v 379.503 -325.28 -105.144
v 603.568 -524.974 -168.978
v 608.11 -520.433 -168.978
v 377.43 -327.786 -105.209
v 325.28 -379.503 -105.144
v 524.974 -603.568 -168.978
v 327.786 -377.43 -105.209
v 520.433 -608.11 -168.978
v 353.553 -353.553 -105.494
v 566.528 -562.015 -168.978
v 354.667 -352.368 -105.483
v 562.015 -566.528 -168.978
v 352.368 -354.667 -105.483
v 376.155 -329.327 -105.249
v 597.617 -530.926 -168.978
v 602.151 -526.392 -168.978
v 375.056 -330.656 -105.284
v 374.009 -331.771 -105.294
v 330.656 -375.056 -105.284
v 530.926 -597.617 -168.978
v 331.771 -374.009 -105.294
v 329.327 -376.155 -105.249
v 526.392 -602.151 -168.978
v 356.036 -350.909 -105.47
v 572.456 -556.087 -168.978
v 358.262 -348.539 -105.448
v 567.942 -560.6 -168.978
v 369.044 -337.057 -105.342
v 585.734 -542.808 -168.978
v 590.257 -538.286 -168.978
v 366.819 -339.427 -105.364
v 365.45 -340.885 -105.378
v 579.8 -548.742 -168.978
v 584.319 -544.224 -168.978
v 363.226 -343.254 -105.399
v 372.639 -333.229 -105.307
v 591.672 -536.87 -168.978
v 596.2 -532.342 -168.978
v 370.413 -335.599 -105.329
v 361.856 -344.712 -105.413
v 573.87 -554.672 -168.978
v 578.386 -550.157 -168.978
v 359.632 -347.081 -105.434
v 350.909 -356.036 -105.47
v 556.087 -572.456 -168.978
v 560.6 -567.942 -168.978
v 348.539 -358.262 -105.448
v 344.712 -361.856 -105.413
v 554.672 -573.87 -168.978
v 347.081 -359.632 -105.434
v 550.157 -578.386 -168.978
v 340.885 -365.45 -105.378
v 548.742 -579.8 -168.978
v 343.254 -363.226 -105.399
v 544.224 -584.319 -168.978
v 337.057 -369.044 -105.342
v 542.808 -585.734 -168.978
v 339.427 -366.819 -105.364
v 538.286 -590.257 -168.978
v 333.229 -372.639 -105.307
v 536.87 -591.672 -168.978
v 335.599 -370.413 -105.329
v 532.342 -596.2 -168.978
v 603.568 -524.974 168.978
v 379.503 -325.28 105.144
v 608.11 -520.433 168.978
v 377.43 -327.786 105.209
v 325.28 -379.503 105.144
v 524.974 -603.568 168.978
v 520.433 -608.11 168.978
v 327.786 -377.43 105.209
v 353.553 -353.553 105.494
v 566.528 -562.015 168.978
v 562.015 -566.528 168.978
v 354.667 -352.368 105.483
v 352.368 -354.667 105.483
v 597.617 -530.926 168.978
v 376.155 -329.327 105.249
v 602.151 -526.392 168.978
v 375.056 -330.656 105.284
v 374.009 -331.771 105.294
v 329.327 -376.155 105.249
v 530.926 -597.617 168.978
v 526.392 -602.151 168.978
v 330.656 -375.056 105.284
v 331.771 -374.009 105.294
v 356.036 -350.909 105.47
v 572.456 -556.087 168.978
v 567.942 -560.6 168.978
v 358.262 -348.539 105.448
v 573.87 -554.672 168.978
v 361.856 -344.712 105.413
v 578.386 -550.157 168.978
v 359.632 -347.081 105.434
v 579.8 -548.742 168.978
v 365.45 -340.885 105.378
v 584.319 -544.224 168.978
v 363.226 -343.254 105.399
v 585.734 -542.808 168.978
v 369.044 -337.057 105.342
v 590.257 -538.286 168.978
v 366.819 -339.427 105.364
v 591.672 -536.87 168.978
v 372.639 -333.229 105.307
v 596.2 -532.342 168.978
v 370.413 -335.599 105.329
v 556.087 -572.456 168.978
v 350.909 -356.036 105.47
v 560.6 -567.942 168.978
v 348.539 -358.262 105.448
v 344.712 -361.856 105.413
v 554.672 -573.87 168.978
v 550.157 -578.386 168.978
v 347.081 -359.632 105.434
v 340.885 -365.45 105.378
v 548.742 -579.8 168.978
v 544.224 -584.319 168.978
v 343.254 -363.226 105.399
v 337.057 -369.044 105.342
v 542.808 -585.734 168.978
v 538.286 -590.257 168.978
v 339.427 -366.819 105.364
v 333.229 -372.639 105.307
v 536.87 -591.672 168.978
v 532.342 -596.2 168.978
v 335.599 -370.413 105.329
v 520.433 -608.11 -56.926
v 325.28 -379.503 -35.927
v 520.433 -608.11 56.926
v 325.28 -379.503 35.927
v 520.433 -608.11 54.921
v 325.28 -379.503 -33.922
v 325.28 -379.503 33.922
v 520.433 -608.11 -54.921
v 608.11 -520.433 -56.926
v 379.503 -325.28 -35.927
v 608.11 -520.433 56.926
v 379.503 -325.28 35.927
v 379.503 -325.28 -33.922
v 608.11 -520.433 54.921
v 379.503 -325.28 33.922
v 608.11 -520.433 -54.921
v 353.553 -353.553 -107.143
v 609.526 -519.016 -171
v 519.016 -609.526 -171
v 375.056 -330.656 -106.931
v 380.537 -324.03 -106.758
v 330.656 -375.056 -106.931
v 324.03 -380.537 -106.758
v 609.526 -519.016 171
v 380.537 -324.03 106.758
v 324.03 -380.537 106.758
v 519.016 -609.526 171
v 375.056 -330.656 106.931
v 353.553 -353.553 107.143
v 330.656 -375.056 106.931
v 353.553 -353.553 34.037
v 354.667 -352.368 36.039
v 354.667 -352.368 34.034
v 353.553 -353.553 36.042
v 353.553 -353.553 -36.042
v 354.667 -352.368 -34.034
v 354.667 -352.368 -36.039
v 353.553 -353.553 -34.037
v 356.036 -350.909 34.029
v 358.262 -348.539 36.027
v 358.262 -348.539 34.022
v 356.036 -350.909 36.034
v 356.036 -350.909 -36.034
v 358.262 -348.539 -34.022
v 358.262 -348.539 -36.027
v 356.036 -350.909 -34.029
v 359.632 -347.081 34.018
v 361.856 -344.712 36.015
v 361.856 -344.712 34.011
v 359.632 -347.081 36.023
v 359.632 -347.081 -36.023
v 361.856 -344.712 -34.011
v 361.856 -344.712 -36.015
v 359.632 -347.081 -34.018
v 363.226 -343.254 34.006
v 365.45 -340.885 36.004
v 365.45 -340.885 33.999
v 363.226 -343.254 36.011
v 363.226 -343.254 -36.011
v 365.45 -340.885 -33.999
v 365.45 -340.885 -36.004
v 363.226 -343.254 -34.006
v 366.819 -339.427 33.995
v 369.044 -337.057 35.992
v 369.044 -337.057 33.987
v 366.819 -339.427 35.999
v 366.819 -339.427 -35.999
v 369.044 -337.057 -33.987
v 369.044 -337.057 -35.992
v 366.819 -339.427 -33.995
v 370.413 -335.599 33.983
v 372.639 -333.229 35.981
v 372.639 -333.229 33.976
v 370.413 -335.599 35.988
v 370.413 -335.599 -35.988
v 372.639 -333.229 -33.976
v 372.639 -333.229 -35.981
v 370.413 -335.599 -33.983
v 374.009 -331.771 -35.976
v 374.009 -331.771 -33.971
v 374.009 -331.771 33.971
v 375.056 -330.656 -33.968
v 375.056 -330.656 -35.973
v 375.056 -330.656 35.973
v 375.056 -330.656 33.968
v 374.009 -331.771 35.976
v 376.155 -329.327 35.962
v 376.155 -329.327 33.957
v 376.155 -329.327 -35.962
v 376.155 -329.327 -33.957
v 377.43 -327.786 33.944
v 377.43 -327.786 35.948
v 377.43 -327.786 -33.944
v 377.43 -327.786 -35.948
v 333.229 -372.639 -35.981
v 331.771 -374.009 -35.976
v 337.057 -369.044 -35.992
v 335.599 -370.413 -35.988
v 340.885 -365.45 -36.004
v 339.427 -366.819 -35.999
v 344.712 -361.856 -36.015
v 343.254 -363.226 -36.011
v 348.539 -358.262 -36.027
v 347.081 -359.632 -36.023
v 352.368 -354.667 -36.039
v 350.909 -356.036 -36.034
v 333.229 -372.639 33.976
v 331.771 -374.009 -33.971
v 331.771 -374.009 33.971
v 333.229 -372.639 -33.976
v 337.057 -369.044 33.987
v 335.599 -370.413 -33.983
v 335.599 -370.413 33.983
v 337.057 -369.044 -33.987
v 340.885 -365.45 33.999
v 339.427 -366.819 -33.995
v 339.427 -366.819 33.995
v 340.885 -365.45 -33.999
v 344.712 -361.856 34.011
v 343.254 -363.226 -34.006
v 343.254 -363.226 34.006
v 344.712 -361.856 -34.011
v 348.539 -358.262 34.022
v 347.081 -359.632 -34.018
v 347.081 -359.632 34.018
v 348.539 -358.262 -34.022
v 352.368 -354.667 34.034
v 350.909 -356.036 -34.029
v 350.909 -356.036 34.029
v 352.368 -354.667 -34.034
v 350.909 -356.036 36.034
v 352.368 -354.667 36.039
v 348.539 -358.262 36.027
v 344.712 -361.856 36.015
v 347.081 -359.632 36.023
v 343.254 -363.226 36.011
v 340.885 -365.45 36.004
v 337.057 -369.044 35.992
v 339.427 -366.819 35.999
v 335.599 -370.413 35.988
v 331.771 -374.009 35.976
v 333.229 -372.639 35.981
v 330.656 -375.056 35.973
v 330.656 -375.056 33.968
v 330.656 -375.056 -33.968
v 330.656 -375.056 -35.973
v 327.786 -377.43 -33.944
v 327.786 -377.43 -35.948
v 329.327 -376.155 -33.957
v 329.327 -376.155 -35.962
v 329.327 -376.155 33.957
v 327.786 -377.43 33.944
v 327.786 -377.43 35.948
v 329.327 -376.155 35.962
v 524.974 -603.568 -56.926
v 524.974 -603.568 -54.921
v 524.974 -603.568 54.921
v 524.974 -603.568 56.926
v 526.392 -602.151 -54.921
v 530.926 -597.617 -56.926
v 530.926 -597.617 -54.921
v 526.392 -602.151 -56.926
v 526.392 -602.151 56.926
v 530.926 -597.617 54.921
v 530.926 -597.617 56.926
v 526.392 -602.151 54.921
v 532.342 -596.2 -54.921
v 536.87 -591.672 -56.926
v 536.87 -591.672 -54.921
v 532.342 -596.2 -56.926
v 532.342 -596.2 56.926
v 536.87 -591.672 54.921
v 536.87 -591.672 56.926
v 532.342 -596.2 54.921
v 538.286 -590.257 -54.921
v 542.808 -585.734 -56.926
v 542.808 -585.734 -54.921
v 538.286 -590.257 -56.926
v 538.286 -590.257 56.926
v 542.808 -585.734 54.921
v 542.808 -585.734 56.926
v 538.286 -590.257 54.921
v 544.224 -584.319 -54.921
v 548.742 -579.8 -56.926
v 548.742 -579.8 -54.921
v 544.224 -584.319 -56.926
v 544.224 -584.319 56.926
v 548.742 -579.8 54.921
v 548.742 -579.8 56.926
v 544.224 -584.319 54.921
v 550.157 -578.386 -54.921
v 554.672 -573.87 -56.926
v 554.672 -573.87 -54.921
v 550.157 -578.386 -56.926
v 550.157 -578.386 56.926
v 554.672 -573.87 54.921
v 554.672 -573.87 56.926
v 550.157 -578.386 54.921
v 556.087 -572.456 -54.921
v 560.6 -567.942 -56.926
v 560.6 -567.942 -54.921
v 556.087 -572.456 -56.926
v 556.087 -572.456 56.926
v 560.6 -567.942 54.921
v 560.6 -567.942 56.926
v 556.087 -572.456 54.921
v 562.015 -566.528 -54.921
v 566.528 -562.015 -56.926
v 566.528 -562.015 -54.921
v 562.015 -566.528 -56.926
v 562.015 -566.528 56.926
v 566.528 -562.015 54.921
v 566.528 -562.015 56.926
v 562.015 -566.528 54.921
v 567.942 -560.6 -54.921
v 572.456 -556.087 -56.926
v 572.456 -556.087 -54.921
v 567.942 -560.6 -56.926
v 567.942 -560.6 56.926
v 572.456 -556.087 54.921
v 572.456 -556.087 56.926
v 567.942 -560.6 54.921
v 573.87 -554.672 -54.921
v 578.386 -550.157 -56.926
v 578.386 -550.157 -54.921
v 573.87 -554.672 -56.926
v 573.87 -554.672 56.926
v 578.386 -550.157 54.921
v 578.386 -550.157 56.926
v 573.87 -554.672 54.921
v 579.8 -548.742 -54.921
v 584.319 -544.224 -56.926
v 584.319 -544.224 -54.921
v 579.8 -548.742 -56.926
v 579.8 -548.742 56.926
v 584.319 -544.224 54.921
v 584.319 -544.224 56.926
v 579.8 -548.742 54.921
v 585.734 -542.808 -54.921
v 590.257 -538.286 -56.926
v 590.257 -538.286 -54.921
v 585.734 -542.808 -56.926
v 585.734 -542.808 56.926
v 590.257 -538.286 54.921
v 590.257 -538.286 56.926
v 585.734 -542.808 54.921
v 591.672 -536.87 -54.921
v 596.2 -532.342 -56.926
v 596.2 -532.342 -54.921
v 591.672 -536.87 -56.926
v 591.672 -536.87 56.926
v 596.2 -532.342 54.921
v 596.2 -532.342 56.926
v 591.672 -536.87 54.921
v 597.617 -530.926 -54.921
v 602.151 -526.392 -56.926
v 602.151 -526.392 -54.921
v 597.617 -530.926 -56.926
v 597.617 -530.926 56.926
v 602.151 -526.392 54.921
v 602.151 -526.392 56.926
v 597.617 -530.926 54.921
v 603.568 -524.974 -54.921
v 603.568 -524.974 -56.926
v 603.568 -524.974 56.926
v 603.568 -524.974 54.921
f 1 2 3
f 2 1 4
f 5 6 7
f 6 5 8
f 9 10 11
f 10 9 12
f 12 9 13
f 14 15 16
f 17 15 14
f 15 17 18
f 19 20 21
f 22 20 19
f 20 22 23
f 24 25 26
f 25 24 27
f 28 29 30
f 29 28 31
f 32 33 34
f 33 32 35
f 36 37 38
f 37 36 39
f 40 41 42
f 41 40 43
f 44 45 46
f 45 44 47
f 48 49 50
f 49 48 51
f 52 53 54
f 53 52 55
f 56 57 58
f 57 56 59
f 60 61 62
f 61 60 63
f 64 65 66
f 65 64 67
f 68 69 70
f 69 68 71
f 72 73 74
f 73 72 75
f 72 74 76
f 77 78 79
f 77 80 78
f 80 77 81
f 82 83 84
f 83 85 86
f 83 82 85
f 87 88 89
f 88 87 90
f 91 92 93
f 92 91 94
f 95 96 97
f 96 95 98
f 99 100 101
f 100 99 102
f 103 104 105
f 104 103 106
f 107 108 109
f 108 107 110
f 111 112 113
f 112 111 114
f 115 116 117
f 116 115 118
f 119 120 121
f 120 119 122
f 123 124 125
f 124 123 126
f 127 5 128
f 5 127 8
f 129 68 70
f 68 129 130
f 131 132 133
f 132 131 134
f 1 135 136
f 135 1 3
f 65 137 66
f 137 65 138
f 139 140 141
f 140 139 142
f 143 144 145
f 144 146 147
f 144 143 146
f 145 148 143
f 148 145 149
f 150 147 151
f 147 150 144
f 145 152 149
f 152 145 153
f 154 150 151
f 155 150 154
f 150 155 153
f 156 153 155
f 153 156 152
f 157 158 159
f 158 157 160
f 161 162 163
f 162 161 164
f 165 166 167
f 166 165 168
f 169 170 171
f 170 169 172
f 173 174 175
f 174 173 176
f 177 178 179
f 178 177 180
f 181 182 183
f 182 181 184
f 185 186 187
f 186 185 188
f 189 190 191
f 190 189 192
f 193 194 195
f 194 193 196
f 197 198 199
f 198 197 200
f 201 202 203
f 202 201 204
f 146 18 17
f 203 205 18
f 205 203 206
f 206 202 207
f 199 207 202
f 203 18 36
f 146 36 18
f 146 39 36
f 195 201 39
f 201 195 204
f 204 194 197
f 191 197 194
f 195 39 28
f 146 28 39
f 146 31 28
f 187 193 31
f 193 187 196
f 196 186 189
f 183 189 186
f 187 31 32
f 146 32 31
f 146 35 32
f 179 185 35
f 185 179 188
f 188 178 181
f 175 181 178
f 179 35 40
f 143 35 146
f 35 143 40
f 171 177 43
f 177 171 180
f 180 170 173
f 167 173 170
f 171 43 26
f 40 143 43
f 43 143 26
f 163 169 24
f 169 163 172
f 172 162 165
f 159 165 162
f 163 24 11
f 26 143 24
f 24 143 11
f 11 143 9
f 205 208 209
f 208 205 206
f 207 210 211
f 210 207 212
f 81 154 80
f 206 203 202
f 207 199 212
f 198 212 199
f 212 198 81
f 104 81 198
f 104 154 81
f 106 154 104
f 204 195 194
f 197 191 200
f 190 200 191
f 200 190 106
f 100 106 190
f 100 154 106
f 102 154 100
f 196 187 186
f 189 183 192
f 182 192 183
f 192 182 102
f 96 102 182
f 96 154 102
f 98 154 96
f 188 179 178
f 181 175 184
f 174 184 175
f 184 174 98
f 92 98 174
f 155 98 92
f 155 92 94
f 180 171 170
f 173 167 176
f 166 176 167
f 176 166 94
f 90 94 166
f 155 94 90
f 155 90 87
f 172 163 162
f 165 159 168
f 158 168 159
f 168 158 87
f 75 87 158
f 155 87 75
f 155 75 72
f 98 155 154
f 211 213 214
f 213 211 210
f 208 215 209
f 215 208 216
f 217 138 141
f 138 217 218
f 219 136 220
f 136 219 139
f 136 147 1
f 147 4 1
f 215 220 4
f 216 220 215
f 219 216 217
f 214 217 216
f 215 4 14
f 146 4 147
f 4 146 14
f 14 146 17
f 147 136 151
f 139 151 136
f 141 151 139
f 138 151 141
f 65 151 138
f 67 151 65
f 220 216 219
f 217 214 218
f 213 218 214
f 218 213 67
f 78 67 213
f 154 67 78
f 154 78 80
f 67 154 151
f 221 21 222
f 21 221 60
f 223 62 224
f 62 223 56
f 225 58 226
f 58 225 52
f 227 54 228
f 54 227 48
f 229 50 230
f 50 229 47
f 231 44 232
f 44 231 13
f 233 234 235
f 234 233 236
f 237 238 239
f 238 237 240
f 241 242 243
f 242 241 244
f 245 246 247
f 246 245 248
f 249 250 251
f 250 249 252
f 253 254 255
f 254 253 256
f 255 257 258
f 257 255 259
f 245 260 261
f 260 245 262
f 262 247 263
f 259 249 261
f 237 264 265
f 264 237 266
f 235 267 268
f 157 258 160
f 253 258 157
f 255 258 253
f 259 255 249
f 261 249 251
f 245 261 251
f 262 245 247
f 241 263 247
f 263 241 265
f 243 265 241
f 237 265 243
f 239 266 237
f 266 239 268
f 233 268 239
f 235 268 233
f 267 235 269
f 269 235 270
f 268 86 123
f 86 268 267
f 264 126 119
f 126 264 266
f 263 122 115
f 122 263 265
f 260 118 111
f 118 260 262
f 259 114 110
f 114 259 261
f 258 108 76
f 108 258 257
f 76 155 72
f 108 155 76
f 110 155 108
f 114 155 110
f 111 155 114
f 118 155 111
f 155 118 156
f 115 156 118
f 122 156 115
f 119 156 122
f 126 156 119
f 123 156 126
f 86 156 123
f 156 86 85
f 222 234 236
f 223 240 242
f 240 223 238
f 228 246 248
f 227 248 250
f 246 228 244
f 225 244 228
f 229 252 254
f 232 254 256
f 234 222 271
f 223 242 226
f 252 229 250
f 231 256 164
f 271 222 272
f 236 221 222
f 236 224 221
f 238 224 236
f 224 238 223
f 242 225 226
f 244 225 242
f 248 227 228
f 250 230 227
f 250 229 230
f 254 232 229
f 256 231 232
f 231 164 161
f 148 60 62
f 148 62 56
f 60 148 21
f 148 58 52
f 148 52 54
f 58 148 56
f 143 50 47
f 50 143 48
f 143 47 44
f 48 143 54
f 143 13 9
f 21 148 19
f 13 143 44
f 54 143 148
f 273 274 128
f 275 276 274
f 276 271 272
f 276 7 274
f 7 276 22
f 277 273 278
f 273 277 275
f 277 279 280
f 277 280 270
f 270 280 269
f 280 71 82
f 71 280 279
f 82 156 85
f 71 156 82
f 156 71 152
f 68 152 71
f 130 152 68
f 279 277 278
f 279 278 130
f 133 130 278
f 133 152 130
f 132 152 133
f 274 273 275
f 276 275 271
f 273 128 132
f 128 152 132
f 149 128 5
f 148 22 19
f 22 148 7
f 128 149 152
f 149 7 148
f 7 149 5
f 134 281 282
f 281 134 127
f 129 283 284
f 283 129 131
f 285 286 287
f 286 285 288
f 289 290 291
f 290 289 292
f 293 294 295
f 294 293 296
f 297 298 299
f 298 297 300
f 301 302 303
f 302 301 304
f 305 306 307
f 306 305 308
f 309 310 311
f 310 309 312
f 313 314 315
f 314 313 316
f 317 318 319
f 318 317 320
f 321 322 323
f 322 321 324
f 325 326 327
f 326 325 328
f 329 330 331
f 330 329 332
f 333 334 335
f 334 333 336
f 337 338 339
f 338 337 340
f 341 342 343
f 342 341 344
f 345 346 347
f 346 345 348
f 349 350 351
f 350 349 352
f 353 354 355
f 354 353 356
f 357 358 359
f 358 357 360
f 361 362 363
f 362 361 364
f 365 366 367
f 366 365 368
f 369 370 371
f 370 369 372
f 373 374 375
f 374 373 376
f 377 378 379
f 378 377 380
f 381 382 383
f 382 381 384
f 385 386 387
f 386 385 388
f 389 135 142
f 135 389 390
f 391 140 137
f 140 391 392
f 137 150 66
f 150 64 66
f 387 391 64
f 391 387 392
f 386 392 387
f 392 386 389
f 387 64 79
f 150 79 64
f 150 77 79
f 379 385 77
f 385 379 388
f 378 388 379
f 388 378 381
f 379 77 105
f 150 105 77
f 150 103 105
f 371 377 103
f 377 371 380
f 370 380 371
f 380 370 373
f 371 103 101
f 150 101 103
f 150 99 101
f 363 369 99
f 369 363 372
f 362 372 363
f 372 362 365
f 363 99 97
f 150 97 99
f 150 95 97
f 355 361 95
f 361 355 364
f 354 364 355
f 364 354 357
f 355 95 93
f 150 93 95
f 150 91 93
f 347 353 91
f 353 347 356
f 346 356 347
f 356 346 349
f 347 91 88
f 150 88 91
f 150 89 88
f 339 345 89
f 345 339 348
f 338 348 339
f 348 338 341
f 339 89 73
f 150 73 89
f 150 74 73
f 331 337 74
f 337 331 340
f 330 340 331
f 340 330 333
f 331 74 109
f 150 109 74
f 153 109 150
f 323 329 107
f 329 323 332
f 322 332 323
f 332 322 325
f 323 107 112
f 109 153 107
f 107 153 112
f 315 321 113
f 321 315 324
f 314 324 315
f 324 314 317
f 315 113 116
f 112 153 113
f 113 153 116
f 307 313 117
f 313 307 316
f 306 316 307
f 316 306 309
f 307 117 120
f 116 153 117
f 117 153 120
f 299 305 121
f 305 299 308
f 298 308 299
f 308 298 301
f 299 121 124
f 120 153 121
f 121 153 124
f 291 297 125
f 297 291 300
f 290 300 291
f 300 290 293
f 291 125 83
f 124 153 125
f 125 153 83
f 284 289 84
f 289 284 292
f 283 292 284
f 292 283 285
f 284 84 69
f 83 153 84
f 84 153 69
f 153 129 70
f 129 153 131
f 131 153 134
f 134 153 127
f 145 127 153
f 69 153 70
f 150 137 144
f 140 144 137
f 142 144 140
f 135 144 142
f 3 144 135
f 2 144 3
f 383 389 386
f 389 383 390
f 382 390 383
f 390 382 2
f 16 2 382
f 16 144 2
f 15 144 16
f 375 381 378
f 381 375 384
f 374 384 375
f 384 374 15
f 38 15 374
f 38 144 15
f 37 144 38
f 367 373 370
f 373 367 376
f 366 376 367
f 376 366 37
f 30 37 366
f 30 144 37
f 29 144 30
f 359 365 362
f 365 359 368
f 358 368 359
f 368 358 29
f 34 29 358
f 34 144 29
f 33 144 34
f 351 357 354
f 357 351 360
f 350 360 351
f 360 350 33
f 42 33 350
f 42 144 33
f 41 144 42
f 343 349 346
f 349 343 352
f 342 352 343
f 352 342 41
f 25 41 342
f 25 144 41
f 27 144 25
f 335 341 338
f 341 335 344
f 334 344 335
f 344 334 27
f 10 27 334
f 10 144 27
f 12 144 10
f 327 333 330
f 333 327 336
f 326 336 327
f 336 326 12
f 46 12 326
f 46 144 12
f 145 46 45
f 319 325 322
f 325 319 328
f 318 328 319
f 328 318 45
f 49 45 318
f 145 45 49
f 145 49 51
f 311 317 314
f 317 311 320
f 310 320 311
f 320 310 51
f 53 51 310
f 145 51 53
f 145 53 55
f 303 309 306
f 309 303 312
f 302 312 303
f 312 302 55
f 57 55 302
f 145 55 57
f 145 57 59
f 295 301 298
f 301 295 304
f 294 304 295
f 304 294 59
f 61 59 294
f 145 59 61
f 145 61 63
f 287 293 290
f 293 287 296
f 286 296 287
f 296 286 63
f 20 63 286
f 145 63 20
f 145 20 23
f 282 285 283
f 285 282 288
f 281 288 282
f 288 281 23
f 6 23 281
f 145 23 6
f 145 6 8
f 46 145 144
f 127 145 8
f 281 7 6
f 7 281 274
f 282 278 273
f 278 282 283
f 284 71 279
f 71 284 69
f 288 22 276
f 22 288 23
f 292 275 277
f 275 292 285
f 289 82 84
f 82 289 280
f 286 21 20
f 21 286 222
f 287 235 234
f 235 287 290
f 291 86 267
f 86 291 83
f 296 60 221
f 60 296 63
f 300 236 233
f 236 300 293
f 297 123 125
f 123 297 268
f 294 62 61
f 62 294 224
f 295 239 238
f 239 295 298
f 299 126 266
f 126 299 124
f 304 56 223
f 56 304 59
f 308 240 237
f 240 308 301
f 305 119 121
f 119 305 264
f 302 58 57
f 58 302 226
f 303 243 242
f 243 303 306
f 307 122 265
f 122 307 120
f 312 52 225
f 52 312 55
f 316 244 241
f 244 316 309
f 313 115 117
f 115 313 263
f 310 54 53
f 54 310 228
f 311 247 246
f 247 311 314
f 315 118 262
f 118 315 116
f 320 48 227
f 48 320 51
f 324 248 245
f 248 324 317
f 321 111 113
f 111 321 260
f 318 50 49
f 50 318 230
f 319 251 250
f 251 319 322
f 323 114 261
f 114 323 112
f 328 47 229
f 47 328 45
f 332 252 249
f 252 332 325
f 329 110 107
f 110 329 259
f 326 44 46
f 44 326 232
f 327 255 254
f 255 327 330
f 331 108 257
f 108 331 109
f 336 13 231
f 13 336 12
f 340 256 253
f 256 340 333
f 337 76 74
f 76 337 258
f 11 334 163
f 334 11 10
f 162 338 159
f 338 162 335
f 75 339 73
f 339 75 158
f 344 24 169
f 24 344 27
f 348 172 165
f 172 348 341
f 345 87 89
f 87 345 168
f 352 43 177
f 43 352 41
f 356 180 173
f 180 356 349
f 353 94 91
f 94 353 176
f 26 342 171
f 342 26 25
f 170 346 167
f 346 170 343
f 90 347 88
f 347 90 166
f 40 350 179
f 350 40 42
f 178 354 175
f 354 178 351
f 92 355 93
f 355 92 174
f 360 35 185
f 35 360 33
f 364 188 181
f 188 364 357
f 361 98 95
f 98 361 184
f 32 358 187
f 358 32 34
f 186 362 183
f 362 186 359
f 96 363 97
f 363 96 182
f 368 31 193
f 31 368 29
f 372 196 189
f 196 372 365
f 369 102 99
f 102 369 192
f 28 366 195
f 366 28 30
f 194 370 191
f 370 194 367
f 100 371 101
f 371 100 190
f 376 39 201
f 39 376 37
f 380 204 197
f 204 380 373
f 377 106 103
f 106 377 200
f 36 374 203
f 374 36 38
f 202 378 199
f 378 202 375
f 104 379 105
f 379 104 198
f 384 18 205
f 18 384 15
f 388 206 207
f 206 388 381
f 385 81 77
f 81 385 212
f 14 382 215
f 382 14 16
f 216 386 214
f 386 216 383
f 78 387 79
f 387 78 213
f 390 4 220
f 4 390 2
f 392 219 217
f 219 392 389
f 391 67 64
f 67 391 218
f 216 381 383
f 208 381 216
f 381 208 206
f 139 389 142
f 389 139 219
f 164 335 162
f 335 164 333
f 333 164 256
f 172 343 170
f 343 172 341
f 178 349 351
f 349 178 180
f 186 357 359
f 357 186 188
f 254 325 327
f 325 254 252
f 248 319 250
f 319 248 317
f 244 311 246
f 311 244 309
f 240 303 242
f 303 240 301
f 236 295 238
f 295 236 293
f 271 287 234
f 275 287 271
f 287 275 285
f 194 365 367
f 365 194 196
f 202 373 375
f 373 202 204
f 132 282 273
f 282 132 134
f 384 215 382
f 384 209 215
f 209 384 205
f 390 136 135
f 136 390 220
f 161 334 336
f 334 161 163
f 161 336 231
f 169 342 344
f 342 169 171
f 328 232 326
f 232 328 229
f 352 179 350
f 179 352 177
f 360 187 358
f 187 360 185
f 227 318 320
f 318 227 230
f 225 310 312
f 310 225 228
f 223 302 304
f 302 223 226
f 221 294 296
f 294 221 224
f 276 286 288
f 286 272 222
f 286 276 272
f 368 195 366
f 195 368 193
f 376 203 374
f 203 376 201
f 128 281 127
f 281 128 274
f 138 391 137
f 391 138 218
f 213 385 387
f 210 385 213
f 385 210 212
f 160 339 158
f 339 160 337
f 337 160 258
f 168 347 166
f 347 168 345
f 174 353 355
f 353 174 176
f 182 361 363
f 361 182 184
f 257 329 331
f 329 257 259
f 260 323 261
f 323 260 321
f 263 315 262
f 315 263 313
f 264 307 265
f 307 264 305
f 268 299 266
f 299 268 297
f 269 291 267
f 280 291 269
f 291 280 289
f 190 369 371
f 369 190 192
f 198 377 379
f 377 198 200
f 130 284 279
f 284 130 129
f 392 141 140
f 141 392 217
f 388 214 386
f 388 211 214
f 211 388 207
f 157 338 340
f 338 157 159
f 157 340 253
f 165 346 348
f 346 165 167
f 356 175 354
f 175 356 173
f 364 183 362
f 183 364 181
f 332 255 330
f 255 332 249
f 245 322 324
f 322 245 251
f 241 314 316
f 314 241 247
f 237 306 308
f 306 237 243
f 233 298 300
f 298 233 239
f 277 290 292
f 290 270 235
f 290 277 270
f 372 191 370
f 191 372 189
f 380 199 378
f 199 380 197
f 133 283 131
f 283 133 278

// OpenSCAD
rotate(135.0, [0.0, 0.0, 1.0]) {
    union() {
    intersection() {
    difference() {
    intersection() {
    union() {
    union() {
    union() {
    rotate(-12.0260924195, [0.0, 1.0, 0.0]) {
    rotate(90.0, [1.0, 0.0, 0.0]) {
    rotate(90.0, [0.0, 1.0, 0.0]) {
    translate([0.0, 0.0, -478.8]) {
    cube([150.887042086, 2.0, 957.6], center=true);
}
}
}
}
    rotate(12.0260924195, [0.0, 1.0, 0.0]) {
    rotate(90.0, [1.0, 0.0, 0.0]) {
    rotate(90.0, [0.0, 1.0, 0.0]) {
    translate([0.0, 0.0, -478.8]) {
    cube([150.887042086, 2.0, 957.6], center=true);
}
}
}
}
}
    rotate(-4.513988458, [0.0, 0.0, 1.0]) {
    rotate(90.0, [0.0, 1.0, 0.0]) {
    translate([0.0, 0.0, -478.8]) {
    cube([401.990729466, 2.0, 957.6], center=true);
}
}
}
}
    rotate(4.513988458, [0.0, 0.0, 1.0]) {
    rotate(90.0, [0.0, 1.0, 0.0]) {
    translate([0.0, 0.0, -478.8]) {
    cube([401.990729466, 2.0, 957.6], center=true);
}
}
}
}
    rotate(90.0, [0.0, 1.0, 0.0]) {
    polyhedron(
    points=[ [188.1,70.4,-877.8], [188.1,-70.4,-877.8],
             [-188.1,-70.4,-877.8], [-188.1,70.4,-877.8], [0,0,0] ],
    faces=[ [0,1,4], [1,2,4], [2,3,4], [3,0,4], [1,0,3], [2,1,3] ]
);
}
}
    cylinder(h = 30600.0, r = 500.0, $fn=100, center=true);
}
    rotate(90.0, [0.0, 1.0, 0.0]) {
    translate([0.0, 0.0, -399.0]) {
    cube([408.0, 957.6, 798.0], center=true);
}
}
}
    intersection() {
    difference() {
    intersection() {
    union() {
    union() {
    rotate(-3.91212333027, [0.0, 0.0, 1.0]) {
    rotate(90.0, [0.0, 1.0, 0.0]) {
    translate([0.0, 0.0, -478.8]) {
    cube([401.990729466, 2.0, 957.6], center=true);
}
}
}
    rotate(-3.31025820253, [0.0, 0.0, 1.0]) {
    rotate(90.0, [0.0, 1.0, 0.0]) {
    translate([0.0, 0.0, -478.8]) {
    cube([401.990729466, 2.0, 957.6], center=true);
}
}
}
    rotate(-2.7083930748, [0.0, 0.0, 1.0]) {
    rotate(90.0, [0.0, 1.0, 0.0]) {
    translate([0.0, 0.0, -478.8]) {
    cube([401.990729466, 2.0, 957.6], center=true);
}
}
}
    rotate(-2.10652794707, [0.0, 0.0, 1.0]) {
    rotate(90.0, [0.0, 1.0, 0.0]) {
    translate([0.0, 0.0, -478.8]) {
    cube([401.990729466, 2.0, 957.6], center=true);
}
}
}
    rotate(-1.50466281933, [0.0, 0.0, 1.0]) {
    rotate(90.0, [0.0, 1.0, 0.0]) {
    translate([0.0, 0.0, -478.8]) {
    cube([401.990729466, 2.0, 957.6], center=true);
}
}
}
    rotate(-0.9027976916, [0.0, 0.0, 1.0]) {
    rotate(90.0, [0.0, 1.0, 0.0]) {
    translate([0.0, 0.0, -478.8]) {
    cube([401.990729466, 2.0, 957.6], center=true);
}
}
}
    rotate(-0.300932563867, [0.0, 0.0, 1.0]) {
    rotate(90.0, [0.0, 1.0, 0.0]) {
    translate([0.0, 0.0, -478.8]) {
    cube([401.990729466, 2.0, 957.6], center=true);
}
}
}
    rotate(0.300932563867, [0.0, 0.0, 1.0]) {
    rotate(90.0, [0.0, 1.0, 0.0]) {
    translate([0.0, 0.0, -478.8]) {
    cube([401.990729466, 2.0, 957.6], center=true);
}
}
}
    rotate(0.9027976916, [0.0, 0.0, 1.0]) {
    rotate(90.0, [0.0, 1.0, 0.0]) {
    translate([0.0, 0.0, -478.8]) {
    cube([401.990729466, 2.0, 957.6], center=true);
}
}
}
    rotate(1.50466281933, [0.0, 0.0, 1.0]) {
    rotate(90.0, [0.0, 1.0, 0.0]) {
    translate([0.0, 0.0, -478.8]) {
    cube([401.990729466, 2.0, 957.6], center=true);
}
}
}
    rotate(2.10652794707, [0.0, 0.0, 1.0]) {
    rotate(90.0, [0.0, 1.0, 0.0]) {
    translate([0.0, 0.0, -478.8]) {
    cube([401.990729466, 2.0, 957.6], center=true);
}
}
}
    rotate(2.7083930748, [0.0, 0.0, 1.0]) {
    rotate(90.0, [0.0, 1.0, 0.0]) {
    translate([0.0, 0.0, -478.8]) {
    cube([401.990729466, 2.0, 957.6], center=true);
}
}
}
    rotate(3.31025820253, [0.0, 0.0, 1.0]) {
    rotate(90.0, [0.0, 1.0, 0.0]) {
    translate([0.0, 0.0, -478.8]) {
    cube([401.990729466, 2.0, 957.6], center=true);
}
}
}
    rotate(3.91212333027, [0.0, 0.0, 1.0]) {
    rotate(90.0, [0.0, 1.0, 0.0]) {
    translate([0.0, 0.0, -478.8]) {
    cube([401.990729466, 2.0, 957.6], center=true);
}
}
}
}
    union() {
    rotate(-4.00869747316, [0.0, 1.0, 0.0]) {
    rotate(90.0, [1.0, 0.0, 0.0]) {
    rotate(90.0, [0.0, 1.0, 0.0]) {
    translate([0.0, 0.0, -478.8]) {
    cube([150.887042086, 2.0, 957.6], center=true);
}
}
}
}
    rotate(4.00869747316, [0.0, 1.0, 0.0]) {
    rotate(90.0, [1.0, 0.0, 0.0]) {
    rotate(90.0, [0.0, 1.0, 0.0]) {
    translate([0.0, 0.0, -478.8]) {
    cube([150.887042086, 2.0, 957.6], center=true);
}
}
}
}
}
}
    rotate(90.0, [0.0, 1.0, 0.0]) {
    polyhedron(
    points=[ [188.1,70.4,-877.8], [188.1,-70.4,-877.8],
             [-188.1,-70.4,-877.8], [-188.1,70.4,-877.8], [0,0,0] ],
    faces=[ [0,1,4], [1,2,4], [2,3,4], [3,0,4], [1,0,3], [2,1,3] ]
);
}
}
    cylinder(h = 3400.0, r = 500.0, $fn=100, center=true);
}
    rotate(90.0, [0.0, 1.0, 0.0]) {
    translate([0.0, 0.0, -399.0]) {
    cube([408.0, 957.6, 798.0], center=true);
}
}
}
}
}
